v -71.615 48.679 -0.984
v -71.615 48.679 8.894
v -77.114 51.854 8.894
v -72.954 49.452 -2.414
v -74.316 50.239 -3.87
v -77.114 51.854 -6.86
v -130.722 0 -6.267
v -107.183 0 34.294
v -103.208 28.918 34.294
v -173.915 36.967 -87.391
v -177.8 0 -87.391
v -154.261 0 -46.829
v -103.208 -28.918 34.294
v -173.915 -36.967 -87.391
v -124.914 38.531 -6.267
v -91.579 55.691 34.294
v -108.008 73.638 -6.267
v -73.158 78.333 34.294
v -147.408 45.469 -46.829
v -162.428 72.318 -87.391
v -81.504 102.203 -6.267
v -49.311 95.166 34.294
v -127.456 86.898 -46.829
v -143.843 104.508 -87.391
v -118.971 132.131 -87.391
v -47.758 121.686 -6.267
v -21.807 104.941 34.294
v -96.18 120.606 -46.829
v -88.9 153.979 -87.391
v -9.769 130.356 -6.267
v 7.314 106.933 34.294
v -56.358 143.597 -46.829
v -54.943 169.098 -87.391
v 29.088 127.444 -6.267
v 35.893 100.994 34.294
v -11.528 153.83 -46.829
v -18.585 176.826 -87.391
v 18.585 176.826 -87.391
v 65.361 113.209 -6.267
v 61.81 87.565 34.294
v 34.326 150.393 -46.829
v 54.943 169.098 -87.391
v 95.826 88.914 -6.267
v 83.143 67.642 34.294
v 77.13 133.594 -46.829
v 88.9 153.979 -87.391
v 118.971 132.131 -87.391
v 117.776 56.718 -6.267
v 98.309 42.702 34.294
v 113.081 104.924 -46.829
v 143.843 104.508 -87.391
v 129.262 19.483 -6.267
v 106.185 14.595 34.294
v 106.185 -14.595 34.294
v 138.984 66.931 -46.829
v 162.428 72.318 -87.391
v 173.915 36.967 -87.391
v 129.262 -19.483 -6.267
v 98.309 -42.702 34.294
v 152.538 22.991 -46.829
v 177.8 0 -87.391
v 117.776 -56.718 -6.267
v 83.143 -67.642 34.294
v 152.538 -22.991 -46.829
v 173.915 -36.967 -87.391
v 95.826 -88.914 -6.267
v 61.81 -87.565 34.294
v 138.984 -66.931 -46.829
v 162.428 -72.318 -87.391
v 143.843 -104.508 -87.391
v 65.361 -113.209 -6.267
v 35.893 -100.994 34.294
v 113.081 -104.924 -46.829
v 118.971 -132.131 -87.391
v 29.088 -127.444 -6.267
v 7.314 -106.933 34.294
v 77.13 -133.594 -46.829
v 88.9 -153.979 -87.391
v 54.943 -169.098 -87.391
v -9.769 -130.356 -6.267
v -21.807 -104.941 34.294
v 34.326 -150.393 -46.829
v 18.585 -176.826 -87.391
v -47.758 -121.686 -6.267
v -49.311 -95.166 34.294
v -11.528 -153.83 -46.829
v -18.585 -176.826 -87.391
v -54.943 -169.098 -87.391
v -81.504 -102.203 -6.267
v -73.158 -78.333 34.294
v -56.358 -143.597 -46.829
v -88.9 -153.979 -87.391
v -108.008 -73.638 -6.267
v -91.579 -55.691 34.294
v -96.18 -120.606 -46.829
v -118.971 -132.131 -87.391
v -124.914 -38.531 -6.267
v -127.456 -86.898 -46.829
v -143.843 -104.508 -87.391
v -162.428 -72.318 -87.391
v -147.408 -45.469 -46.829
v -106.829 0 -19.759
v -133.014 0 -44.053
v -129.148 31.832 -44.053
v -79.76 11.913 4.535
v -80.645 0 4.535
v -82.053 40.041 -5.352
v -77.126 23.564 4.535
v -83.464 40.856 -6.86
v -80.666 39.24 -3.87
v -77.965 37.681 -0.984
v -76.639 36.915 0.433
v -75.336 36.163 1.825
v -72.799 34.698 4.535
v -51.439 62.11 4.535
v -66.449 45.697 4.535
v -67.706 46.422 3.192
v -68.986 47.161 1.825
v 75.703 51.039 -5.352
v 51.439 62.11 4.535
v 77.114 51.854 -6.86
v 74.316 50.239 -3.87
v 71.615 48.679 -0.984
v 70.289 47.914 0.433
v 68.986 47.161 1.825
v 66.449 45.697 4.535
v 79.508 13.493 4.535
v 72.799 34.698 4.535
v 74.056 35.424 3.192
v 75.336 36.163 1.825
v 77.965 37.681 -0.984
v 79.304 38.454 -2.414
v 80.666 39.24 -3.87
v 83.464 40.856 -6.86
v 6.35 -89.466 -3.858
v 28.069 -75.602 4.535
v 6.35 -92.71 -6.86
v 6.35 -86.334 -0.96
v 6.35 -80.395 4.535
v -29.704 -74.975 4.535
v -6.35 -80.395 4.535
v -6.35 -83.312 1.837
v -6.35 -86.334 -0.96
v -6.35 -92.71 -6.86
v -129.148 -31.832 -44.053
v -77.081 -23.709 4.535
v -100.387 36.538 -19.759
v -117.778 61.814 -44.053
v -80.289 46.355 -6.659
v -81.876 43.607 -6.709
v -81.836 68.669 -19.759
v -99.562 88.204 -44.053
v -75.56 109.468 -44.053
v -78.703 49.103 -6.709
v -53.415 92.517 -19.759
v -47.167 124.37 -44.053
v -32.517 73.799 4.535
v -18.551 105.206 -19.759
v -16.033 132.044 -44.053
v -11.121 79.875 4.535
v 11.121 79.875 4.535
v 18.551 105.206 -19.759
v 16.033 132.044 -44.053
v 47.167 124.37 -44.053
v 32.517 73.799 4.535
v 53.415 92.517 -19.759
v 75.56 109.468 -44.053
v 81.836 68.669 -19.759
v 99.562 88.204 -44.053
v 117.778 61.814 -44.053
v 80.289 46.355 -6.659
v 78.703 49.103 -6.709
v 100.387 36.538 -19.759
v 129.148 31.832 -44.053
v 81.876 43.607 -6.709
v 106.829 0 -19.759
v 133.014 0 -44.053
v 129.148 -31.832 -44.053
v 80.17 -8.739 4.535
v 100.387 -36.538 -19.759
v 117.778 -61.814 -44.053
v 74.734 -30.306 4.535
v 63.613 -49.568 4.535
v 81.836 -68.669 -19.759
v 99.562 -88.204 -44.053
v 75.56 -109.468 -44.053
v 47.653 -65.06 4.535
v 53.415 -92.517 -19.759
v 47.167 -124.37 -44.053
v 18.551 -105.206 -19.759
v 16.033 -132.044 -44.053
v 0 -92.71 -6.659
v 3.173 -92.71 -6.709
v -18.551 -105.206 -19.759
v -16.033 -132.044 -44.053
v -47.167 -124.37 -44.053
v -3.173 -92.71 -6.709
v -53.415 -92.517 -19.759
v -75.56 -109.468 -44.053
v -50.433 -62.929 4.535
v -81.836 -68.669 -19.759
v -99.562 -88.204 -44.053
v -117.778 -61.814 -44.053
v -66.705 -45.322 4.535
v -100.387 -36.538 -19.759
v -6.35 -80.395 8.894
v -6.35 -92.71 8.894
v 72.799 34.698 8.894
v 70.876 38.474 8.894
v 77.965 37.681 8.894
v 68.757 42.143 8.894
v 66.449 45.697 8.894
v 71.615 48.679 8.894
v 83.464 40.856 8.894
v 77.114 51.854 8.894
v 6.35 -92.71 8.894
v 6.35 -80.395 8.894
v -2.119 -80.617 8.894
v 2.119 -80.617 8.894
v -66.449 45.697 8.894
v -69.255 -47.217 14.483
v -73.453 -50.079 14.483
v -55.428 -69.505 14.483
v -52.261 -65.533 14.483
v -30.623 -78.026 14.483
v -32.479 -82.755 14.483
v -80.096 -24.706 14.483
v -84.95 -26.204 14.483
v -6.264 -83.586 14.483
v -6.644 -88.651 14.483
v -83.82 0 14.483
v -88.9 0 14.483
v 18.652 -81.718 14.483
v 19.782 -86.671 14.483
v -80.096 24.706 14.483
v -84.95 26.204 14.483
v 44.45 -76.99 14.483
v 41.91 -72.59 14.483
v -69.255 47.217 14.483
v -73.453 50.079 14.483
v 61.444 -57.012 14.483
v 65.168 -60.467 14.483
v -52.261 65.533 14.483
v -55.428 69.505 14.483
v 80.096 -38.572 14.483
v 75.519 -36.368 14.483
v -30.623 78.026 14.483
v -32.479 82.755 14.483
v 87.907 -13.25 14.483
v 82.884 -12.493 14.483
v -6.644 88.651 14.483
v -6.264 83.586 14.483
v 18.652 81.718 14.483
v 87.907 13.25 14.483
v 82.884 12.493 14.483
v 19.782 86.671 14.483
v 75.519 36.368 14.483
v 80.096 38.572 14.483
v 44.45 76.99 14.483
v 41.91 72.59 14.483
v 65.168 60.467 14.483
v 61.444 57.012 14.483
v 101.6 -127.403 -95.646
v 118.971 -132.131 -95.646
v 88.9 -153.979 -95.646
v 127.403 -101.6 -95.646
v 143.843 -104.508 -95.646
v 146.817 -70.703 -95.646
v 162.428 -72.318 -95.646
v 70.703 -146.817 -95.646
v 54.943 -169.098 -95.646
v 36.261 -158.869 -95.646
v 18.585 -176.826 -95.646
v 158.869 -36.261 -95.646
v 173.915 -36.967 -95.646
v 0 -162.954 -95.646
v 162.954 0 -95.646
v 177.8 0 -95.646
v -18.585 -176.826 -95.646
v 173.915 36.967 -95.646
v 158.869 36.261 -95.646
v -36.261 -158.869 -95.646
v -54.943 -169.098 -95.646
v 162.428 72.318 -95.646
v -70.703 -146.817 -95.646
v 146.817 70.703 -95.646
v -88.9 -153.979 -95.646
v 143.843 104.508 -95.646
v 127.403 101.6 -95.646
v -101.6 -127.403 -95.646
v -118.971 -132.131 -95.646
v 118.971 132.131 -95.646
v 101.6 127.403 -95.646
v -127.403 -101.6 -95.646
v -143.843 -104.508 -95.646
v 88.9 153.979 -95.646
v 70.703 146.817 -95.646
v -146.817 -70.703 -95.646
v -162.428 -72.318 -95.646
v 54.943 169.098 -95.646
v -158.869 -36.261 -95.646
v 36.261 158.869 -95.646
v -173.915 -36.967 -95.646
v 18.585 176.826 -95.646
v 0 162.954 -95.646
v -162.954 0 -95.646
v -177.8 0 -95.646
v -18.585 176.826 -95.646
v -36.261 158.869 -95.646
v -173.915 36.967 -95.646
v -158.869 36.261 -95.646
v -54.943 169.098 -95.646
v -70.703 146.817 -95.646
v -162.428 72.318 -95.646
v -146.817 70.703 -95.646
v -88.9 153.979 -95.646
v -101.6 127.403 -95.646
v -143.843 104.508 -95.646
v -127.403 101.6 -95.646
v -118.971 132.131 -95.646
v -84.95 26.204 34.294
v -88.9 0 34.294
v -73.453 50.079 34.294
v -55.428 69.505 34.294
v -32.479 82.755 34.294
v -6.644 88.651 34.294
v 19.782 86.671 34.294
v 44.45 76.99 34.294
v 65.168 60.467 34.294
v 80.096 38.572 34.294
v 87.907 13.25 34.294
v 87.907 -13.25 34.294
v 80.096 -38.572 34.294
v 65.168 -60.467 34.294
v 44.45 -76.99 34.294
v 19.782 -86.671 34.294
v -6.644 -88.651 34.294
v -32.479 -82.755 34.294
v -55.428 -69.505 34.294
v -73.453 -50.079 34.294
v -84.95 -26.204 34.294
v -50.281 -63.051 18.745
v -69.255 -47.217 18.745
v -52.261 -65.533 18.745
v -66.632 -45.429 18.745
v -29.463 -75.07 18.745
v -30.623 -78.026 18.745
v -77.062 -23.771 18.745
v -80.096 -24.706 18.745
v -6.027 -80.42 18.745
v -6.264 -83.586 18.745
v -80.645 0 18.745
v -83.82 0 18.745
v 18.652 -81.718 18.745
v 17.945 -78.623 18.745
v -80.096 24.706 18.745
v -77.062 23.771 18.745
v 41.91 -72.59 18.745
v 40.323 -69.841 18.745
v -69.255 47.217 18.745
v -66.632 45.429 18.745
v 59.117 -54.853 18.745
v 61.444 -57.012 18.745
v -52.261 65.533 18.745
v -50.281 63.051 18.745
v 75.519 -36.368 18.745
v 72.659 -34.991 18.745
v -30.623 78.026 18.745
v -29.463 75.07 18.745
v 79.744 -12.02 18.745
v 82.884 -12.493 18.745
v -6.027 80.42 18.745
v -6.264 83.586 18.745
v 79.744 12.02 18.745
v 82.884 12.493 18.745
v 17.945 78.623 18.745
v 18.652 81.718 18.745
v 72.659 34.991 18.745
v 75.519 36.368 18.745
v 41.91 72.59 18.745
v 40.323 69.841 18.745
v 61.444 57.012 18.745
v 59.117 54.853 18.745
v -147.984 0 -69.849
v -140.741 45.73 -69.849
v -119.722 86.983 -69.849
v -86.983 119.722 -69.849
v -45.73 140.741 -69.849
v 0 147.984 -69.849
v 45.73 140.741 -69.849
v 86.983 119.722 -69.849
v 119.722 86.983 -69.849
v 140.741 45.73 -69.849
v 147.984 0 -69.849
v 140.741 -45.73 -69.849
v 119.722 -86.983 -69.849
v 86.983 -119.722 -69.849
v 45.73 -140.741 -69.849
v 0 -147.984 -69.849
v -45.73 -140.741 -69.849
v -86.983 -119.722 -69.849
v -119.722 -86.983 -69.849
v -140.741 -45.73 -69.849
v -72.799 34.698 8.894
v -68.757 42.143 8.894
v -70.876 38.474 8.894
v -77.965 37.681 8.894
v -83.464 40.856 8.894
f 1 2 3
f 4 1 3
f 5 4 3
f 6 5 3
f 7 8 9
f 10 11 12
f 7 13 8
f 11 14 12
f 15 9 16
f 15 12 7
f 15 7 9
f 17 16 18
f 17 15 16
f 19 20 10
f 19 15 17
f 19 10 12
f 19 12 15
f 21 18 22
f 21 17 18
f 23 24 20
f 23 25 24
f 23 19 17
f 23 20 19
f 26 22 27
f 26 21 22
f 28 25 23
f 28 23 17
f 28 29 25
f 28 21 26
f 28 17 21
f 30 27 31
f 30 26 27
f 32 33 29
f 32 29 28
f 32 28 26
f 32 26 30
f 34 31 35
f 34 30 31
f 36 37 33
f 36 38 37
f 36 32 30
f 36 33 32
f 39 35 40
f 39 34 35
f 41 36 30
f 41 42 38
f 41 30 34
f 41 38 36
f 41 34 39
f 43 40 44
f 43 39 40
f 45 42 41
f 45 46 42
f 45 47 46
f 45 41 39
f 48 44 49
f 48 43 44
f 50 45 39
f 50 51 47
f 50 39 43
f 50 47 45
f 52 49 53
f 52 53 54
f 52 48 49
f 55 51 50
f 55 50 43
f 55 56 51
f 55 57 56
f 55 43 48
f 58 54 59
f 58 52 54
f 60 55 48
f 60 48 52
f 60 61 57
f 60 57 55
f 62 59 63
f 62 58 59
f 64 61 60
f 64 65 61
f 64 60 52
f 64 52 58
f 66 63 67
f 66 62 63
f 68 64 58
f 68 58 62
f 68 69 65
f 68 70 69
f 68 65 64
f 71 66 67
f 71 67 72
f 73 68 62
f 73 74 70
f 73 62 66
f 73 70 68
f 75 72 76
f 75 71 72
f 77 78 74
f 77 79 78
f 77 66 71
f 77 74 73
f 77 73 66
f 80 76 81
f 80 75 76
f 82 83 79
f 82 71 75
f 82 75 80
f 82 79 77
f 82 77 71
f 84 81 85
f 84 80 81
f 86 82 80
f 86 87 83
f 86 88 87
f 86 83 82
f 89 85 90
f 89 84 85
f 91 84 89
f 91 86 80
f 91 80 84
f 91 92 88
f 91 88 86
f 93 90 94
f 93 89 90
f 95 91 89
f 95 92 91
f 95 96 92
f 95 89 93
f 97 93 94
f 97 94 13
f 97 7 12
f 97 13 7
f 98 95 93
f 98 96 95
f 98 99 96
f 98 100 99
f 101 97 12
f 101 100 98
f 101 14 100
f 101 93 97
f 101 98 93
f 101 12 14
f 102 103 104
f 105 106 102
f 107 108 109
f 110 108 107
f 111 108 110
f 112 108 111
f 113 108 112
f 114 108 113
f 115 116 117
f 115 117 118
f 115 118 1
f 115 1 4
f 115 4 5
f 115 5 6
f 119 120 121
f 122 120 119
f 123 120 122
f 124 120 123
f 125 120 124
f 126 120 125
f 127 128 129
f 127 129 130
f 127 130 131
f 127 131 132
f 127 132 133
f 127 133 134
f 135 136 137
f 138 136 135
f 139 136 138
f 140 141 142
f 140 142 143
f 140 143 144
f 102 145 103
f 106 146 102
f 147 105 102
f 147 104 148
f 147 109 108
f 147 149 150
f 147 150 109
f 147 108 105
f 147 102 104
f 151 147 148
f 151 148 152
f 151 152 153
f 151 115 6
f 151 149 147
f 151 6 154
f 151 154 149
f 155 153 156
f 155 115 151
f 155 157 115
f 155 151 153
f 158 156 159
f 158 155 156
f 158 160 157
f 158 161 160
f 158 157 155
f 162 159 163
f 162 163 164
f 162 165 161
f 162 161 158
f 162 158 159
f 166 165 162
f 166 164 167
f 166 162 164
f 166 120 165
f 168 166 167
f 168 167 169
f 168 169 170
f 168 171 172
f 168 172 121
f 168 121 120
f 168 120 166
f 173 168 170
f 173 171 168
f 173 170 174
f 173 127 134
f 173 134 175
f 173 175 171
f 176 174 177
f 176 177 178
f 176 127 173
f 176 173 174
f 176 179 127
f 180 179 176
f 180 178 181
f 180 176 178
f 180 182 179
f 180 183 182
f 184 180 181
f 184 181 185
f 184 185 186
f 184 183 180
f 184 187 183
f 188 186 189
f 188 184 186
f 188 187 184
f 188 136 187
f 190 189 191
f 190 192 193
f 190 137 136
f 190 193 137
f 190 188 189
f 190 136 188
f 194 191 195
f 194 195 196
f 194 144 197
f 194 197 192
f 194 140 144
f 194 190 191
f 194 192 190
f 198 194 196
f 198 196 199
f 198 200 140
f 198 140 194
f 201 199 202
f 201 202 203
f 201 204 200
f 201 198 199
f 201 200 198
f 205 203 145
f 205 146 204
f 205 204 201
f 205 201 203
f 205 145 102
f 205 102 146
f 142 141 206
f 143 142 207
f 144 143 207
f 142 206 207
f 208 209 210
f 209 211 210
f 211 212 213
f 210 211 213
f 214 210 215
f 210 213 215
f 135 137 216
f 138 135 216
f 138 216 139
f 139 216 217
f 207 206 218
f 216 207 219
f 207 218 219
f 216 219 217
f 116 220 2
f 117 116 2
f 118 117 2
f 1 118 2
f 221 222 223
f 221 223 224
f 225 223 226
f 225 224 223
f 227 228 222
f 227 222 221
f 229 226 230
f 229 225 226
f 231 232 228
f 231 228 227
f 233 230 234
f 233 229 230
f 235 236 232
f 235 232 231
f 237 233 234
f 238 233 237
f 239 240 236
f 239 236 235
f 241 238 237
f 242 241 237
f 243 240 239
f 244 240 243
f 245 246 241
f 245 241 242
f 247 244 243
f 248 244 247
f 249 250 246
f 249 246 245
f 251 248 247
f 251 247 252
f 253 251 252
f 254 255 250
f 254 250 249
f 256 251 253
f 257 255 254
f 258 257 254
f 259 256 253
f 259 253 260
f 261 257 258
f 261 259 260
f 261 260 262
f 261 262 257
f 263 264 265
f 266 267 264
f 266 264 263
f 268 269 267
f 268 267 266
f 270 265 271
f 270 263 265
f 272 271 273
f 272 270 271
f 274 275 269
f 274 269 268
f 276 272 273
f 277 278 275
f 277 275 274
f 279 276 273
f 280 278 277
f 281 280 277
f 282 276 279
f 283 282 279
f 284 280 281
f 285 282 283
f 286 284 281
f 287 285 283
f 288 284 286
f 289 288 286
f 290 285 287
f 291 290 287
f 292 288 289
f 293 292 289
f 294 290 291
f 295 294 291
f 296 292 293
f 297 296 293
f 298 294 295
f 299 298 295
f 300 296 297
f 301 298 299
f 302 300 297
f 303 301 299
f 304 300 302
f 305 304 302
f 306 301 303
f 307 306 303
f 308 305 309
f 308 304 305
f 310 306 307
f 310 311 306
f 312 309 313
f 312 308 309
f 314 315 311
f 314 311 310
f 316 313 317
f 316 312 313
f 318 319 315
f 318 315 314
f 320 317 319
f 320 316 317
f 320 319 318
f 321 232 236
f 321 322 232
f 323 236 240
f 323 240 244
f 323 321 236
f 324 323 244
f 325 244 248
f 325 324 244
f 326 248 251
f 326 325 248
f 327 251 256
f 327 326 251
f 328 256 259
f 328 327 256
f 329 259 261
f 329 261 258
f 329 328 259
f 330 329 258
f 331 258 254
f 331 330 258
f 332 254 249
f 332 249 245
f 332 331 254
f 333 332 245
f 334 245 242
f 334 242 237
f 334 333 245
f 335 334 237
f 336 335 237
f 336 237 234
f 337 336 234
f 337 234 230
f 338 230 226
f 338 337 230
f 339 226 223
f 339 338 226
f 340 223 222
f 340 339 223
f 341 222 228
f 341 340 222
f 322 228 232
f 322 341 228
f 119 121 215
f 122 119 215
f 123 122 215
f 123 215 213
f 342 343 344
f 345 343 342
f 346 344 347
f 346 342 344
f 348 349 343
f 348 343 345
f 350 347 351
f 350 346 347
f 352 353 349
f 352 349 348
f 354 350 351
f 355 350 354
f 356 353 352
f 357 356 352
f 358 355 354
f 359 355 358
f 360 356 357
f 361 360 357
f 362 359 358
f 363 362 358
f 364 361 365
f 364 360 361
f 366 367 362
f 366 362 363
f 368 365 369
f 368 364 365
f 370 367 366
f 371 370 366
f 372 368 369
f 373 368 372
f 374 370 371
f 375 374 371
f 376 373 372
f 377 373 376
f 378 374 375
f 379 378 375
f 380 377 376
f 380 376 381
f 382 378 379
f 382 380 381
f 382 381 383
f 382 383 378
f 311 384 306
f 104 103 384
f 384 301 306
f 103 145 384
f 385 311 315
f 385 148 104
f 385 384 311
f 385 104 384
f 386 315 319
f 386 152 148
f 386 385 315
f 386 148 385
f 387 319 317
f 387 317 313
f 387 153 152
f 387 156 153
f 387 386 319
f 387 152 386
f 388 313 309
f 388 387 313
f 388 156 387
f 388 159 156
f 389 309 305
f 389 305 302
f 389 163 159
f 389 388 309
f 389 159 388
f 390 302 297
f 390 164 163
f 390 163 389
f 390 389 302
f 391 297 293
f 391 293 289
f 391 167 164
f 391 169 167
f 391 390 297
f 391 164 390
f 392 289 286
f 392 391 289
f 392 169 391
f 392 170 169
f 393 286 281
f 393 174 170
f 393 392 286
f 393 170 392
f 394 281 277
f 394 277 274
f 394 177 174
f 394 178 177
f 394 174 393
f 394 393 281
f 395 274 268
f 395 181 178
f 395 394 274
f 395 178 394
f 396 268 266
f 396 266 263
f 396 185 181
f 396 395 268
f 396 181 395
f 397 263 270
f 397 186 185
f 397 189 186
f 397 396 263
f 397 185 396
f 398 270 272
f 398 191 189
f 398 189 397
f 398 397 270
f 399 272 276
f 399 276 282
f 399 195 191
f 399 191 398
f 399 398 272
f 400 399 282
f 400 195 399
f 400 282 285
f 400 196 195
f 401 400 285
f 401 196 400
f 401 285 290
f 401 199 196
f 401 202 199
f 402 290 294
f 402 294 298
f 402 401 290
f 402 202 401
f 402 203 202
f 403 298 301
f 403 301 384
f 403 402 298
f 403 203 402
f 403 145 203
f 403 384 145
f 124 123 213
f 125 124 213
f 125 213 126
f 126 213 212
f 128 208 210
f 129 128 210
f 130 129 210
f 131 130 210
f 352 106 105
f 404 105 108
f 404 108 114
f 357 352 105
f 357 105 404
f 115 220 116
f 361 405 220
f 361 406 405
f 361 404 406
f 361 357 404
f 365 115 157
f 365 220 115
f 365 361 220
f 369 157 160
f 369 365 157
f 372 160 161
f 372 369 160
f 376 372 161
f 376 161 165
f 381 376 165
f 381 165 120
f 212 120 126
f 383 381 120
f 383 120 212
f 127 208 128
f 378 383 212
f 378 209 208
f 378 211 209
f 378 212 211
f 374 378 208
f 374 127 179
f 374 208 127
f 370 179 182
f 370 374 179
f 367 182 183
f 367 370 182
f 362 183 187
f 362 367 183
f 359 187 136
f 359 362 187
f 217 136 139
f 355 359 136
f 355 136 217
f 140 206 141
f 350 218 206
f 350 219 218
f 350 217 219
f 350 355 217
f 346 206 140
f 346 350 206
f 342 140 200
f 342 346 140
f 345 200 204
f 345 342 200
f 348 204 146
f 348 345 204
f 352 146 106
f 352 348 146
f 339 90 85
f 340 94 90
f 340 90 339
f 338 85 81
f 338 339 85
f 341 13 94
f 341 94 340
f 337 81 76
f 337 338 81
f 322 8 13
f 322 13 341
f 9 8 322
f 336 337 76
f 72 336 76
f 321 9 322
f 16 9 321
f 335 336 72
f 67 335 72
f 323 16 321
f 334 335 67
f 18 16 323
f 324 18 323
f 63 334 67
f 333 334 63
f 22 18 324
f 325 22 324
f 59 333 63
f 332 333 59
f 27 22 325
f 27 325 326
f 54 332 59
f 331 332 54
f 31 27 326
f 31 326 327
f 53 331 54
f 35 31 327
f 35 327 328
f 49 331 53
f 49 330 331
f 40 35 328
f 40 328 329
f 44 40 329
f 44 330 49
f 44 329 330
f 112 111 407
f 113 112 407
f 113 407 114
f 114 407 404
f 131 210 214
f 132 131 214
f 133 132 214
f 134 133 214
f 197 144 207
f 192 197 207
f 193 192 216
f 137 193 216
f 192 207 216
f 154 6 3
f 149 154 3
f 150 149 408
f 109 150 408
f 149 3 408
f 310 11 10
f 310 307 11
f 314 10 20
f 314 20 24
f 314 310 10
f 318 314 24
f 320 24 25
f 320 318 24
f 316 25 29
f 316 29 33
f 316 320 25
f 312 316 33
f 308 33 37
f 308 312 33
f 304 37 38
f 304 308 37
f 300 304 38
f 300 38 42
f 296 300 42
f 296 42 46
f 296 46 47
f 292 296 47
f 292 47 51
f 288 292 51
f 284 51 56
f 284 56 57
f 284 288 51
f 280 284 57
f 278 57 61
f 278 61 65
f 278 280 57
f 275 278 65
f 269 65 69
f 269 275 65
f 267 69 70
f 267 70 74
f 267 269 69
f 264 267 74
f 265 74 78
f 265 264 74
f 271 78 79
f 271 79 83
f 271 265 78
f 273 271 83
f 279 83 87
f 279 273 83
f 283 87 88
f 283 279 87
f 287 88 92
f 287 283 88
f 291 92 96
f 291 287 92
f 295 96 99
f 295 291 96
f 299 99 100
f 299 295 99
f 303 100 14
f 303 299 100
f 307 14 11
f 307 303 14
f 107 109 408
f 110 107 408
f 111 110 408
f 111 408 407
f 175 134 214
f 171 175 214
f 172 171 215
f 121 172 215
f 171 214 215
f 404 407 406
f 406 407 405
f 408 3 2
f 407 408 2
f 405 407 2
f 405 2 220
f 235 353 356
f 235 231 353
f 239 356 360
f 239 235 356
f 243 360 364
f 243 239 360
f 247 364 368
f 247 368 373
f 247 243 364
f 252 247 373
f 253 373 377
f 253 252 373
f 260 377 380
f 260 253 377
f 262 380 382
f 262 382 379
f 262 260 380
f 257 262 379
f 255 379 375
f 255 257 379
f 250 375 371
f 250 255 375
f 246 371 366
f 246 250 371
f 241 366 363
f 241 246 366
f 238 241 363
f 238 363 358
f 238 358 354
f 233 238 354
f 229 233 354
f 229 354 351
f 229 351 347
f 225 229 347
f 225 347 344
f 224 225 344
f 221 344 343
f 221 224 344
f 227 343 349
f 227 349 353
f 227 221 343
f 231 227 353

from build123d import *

# Parameters (mm, degrees)
F4_DEPTH = 25.4


with BuildPart() as f1:
    # F0 (on Front) → F1 (revolve)
    with BuildSketch(Plane.XZ):
        Polygon((-83.82, 18.745402), (-83.82, 14.483047), (-88.9, 14.483047), (-88.9, 34.294205), (-107.182943, 34.294205), (-177.8, -87.390703), (-177.8, -95.645703), (-162.954339, -95.645703), (-133.013525, -44.052713), (-80.645, 4.534993), (-80.645, 18.745402), align=None)
    revolve(axis=Axis((0, 0, -6.240661), (0, 0, -1)))

    # F3 (on offset) → F4 (cut)
    with BuildSketch(Plane.XY.offset(8.894205)):
        Polygon((6.35, -86.36), (6.35, -66.04), (-6.35, -66.04), (-6.35, -86.36), (-6.35, -92.71), (6.35, -92.71), align=None)
        Polygon((-54.017318, 38.519261), (-71.614954, 48.679261), (-77.114215, 51.854261), (-83.464215, 40.855739), (-77.964954, 37.680739), (-60.367318, 27.520739), align=None)
        Polygon((60.367318, 27.520739), (77.964954, 37.680739), (83.464215, 40.855739), (77.114215, 51.854261), (71.614954, 48.679261), (54.017318, 38.519261), align=None)
    extrude(amount=-F4_DEPTH, mode=Mode.SUBTRACT)


solid = f1.part
